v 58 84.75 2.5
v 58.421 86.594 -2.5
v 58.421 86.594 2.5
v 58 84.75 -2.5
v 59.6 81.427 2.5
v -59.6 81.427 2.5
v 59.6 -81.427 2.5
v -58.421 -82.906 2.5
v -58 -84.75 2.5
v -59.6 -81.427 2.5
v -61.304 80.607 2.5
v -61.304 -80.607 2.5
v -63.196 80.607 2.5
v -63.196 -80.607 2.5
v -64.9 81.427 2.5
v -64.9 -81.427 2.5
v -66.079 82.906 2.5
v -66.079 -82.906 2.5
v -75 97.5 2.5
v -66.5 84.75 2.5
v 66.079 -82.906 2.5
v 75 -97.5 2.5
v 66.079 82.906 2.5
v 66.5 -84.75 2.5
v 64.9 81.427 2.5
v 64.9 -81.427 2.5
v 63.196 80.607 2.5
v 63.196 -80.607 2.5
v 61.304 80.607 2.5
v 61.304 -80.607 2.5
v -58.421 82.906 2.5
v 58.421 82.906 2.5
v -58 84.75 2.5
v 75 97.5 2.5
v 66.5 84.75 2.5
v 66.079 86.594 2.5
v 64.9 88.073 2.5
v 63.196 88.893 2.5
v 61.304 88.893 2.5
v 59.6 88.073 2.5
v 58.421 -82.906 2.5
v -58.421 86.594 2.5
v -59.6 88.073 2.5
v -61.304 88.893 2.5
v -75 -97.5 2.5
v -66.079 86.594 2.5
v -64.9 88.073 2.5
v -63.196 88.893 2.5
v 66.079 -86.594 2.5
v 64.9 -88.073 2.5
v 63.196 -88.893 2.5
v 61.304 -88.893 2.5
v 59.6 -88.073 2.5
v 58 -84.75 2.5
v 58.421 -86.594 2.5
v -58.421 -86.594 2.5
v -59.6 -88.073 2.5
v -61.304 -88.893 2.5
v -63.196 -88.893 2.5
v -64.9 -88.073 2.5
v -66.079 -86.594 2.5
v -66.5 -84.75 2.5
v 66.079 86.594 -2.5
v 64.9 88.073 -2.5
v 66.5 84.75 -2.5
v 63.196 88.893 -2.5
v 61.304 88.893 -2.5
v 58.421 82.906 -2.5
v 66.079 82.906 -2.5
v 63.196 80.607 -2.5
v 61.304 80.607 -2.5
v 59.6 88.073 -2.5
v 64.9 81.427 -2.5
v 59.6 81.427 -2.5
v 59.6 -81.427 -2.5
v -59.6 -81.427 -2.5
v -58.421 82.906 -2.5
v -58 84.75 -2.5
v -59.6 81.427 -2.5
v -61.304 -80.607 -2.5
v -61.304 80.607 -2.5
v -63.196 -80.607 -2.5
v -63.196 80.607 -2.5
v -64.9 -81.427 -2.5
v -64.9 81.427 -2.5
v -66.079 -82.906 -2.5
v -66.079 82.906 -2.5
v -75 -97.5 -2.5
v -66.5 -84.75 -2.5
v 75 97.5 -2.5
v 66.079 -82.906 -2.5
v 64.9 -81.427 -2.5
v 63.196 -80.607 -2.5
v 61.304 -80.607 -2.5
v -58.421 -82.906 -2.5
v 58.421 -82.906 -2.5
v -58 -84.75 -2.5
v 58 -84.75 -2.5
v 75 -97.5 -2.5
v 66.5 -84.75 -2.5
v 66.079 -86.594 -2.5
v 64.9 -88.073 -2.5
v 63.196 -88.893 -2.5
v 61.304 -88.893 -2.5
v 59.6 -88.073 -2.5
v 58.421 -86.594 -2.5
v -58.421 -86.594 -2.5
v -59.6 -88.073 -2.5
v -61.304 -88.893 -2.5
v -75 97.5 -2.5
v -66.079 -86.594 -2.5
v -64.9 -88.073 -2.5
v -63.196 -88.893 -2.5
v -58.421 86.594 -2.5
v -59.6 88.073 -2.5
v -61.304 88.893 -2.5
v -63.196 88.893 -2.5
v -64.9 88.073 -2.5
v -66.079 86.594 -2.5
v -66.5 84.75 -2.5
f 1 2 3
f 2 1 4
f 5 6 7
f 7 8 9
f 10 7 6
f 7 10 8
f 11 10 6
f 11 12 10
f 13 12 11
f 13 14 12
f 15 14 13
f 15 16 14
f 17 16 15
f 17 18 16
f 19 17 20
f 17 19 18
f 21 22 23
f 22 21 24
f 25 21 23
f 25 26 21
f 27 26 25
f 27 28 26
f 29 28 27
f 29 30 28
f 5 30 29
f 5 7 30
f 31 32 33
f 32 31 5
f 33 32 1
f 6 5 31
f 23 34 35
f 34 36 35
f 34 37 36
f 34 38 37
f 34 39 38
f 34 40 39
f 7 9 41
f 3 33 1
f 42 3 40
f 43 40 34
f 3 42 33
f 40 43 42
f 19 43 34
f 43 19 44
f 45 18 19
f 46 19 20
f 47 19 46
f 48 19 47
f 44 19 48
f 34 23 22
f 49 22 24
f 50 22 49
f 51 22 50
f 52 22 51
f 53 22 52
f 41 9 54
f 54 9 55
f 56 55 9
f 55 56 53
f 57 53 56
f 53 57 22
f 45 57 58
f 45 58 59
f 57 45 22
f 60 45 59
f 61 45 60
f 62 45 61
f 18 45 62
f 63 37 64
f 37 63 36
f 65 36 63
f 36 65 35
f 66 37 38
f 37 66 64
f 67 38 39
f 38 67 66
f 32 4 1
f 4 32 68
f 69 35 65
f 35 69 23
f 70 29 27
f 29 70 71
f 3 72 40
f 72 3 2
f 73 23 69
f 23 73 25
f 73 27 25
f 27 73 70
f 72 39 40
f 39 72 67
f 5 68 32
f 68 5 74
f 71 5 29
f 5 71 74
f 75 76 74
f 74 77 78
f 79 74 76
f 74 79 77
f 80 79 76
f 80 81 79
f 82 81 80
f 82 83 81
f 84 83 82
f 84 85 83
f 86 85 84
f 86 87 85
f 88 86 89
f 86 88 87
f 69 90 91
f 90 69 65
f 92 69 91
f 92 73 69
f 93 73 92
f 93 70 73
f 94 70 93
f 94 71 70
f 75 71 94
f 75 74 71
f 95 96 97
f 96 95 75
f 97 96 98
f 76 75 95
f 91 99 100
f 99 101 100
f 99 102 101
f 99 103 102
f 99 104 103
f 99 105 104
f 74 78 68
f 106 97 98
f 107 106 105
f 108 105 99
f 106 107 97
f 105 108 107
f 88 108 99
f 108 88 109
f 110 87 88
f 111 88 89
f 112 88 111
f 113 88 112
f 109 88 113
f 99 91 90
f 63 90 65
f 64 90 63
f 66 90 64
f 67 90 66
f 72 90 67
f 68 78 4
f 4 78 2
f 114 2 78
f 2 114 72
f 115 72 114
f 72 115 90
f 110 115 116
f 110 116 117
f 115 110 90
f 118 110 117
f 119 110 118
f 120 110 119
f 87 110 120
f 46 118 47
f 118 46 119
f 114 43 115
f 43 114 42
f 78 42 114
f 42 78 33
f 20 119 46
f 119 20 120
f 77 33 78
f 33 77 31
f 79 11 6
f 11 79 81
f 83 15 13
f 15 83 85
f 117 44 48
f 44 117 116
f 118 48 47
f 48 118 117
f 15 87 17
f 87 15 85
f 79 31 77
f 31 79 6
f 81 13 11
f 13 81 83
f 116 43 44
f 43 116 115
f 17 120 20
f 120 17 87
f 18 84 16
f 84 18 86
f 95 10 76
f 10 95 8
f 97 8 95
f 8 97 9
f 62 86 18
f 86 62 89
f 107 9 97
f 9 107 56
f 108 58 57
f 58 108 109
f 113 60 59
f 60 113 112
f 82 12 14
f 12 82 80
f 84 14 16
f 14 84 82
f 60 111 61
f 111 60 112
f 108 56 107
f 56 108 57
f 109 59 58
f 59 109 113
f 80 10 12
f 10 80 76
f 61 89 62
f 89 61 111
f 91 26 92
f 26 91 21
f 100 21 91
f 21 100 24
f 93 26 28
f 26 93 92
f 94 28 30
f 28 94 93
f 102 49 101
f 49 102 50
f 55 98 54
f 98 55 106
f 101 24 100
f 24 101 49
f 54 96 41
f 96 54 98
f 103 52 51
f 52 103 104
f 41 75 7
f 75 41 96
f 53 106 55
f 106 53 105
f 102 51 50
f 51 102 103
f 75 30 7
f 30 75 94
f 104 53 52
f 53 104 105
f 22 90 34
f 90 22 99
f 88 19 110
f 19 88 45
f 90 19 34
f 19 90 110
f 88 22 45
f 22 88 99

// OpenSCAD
// Generated by SolidPython 1.1.3 on 2024-05-08 19:40:10


difference() {
	cube(center = true, size = [150, 195.0000000000, 5]);
	union() {
		translate(v = [62.2500000000, 84.7500000000]) {
			cylinder(center = true, h = 5, r = 4.2500000000);
		}
		translate(v = [-62.2500000000, 84.7500000000]) {
			cylinder(center = true, h = 5, r = 4.2500000000);
		}
		translate(v = [-62.2500000000, -84.7500000000]) {
			cylinder(center = true, h = 5, r = 4.2500000000);
		}
		translate(v = [62.2500000000, -84.7500000000]) {
			cylinder(center = true, h = 5, r = 4.2500000000);
		}
	}
}
/***********************************************
*********      SolidPython code:      **********
************************************************
 
import solid
import numpy as np
import numbers
import pudb
from solid.utils import *
import viewscad
import subprocess
import os
import os.path as osp
import math
import sys

chamfer_extrude=solid.import_scad("./chamfer_extrude.scad")
chamfer_extrude=chamfer_extrude.chamfer_extrude
r = viewscad.Renderer(width=800, height=800)

def debug(model,f_name,path="/home/ts/code/projects/mfd/designs/debug"):
    solid.scad_render_to_file(model,osp.join(path,f_name)+".scad")
#generate position list of wells using offset from center
wells_pos_from_center_4 = lambda offset: [[-offset,offset],
                                        [offset, offset],
                                        [-offset, -offset],
                                        [offset, -offset]]
wells_pos_from_center_2 = lambda offset: [[offset,0],
                                        [-offset,0]]

def make_well(dims,shape=None,height=None,dxf=False):
    def circle_cylinder():
        if dxf or (height is None):
            well = solid.circle(r=dims, segments=64)
        else:
            well = solid.cylinder(r=dims, h=height, segments=64, center = True)
        return well
    if dims is None:
        sys.exit("radius needs to be a number")
    if isinstance(dims, numbers.Number):
        well =circle_cylinder()
    elif len(dims)==1:
        if isinstance(dims[1], numbers.Number):
            well =circle_cylinder()
        else:
            sys.exit("radius needs to be a number")
    elif len(dims)==2:
        well = solid.square(dims,center = True)
    elif len(dims)==3:
        well = solid.cube(dims, center = True)
    return well

def wells_top_bottom(center_gap,device_dims=None,shape=None,height=None, positions = None, dxf = False,well_shape=None):
    if well_shape == None:
        well_shape = make_well(device_dims,shape=shape,height=height,dxf=dxf)
    wells = []
    if positions is None:
        offset = radius+radius/2.0
        positions = wells_pos_from_center_2(offset)
    if dxf or (height is None):
        height = 0
    for position in positions:
        if dxf:
            wells.append(solid.translate([position[0],position[1]])(well_shape))
        else:
            wells.append(solid.translate([position[0],position[1],height/2.0])(well_shape))
    return  union()(*wells)

#place wells in four corners 
def four_corner(radius,height=None, positions = None, dxf = False):
    #if well pos not specified set
    #to equally spaced by half radius
    if positions is None:
        offset = radius+radius/2.0
        positions = wells_pos_from_center_4(offset)
    if dxf or (height is None):
        height = 0
    #make wells at positions with specified radius and height
    wells = []
    for position in positions:
        #make circle if making dxf
        if dxf:
            well_shape = solid.circle(r=radius, segments=64)
            well_shape = solid.translate([position[0],position[1]])(well_shape)
        #if stl make cylinder
        else:
            well_shape = solid.cylinder(r=radius, h=height, segments=64, center = True)
            well_shape = solid.translate([position[0],position[1],height/2.0])(well_shape)
        wells.append(well_shape)
    return  union()(*wells)

#generate channels 
def make_channels(length,width,height=0,num_chans=1,max_chans=None,spacing=None, dxf = False,
                  rotate_channels=False):
    if dxf or (height is None):
        height = 0
    #if channel gap not defined, is equal to
    if spacing is None: spacing = width
    #calculate number of channels if fitting max num within given width
    if not max_chans is None:
        import math
        num_chans = math.floor((max_chans-spacing)/(width+spacing))
    #get total width of channel section  
    total_width = (width*num_chans)+(spacing*(num_chans-1))

    #make template channel
    #if rotate_channels: width, length = length, width
    if dxf:
        channel_t = solid.square([length,width],center = True)
    else:
        channel_t = solid.cube([length,width,height], center = True)

    #if number channels is even, offset the first channel to center its gap
    if num_chans % 2 == 0: centering = -(width/2.0+spacing/2.0)
    else: centering = 0
    #move template channel up to align bottom at z = 0 
    #and offset center if necessary
    if dxf:
        channel_t = solid.translate([0,centering])(channel_t)
    else:
        channel_t = solid.translate([0,centering,height/2.0])(channel_t)

    #if rotate_channels: length,width = width,length
    #start making the channels
    channels = []
    for i in range(num_chans):
        #if i=0 there is no translation
        #if i=1, we make the first channel adjacent to second
        direction = i

        #if i>=1, we add channels alternating left and right
        if i >= 1:
            direction = -(i/2.0)
            if i % 2 == 1: direction = (-direction)+0.5
                
        #make channel at right position and add it to channel list
        translation_coords = [0,direction*(width+spacing)]
        #if rotate_channels: translation_coords = [direction*(width+spacing),0]
        if dxf:
            channel = solid.translate(translation_coords)(channel_t)
        else:
            channel = solid.translate([*translation_coords,0])(channel_t)
        channels.append(channel)
    
    #group all channels as one object
    channels = union()(*channels)
    #compute the x,y,z dimensions in order to pass as arguments 
    #for construction of other parts of device (such as the chambers)
    measurements = {'x':(length/2.0,-length/2.0),
                    'y':(total_width/2.0,-total_width/2.0)}
    if not dxf:
        measurements['z'] = (height,0)
    if rotate_channels:
        channels = solid.rotate(90)(channels)
        measurements['x'],measurements['y']=measurements['y'],measurements['x']
    return channels,measurements

def make_chambers(msrs,height=None,extra=0,len_until=None,width=None, dxf = False):
    #computes x,y,z length
    total = lambda x : abs(x[0]) + abs(x[1])
    
    #if specific height if specified
    #otherwise use same height as channels
    if dxf:
        pass
    elif not height is None:
        msrs['z'] = (height,0)
    else:
        msrs['z'] = (0,0)
        
    #make copy of measurements from channels to modify chamber dimensions 
    #and add length to chambers as specified
    chamber_dims = msrs.copy()
    #calculate length of chamber to reach specified offset
    if not len_until is None:
        chamber_len = len_until-(msrs['x'][0])
    #or add specified length to channel length (if not specified, adds 0)
    else:
        chamber_len = msrs['x'][0]+extra
    #set the chamber length based 
    chamber_dims['x'] = (chamber_len/2.0,-(chamber_len/2.0))
    #compute final dimensions of chamber
    if not width is None:
        chamber_dims['y'] = (width/2.0,-width/2.0)
    chamber_dims = [total(size) for size in chamber_dims.values()]
        
    #calculate chamber translation offset to place adjacent to channels
    chamber_trslt = msrs['x'][0]+(chamber_len/2.0)
    #compute chamber translation coordinates to align with channels
    #x = 1 moves chamber above channels
    #x = -1 moves chamber below channels
    if dxf:
        trslt = lambda x : [x*(chamber_trslt),0]
    else:
        trslt = lambda x : [x*(chamber_trslt),0,msrs['z'][0]/2.0]
    
    #function to make chamber at top or at bottom 
    if dxf:
        move = lambda x : solid.translate(trslt(x))(solid.square(chamber_dims, center = True) )
    else:
        move = lambda x : solid.translate(trslt(x))(solid.cube(chamber_dims,center = True))
    #make top and bottom chambers and return them as grouped
    top = move(1)
    bottom = move(-1)
    #chambers=solid.rotate(90)(solid.union()(top,bottom))
    chambers=(solid.union()(top,bottom))

    return chambers

#create alignment features 
def alignment_features(unit,dims,grid_size, mask_size = None, alignment = "hollow", units_from_center = (2.5,2.5), corner_len=None):
    width = grid_size[0]*dims[0]
    length = grid_size[1]*dims[1]
    if mask_size is None and corner_len is None:
        corner_len = (dims[0] + dims[1]) /2 / 8
    corner = lambda thickness_div : solid.union()( solid.square([corner_len,corner_len/thickness_div],center=False), solid.square([corner_len/thickness_div,corner_len],center=False) )
    
    def make_full(thickness_div):
        thickness = corner_len/thickness_div
        tr = solid.translate([0, 0, 0 ])(solid.rotate(180)(corner(thickness_div)))
        tr = solid.translate([thickness/2,thickness/2,0])(tr)
        bl = solid.translate([0, 0, 0 ])(solid.rotate(0)(corner(thickness_div)))
        bl = solid.translate([-thickness/2,-thickness/2,0])(bl)
        return solid.union()(tr,bl)
    
    def make_hollow(thickness_div):
        thickness = corner_len/(thickness_div/2)
        inner = make_full(thickness_div)
        outer = make_full(thickness_div/2)
        hollow = outer - inner 
        return hollow
    
    center = (width /2 , length/2)
    mask_pos = lambda x,y : (center[0] + x*(float(units_from_center[0])*dims[0]), center[1] + y*(float(units_from_center[1])*dims[1]))
    positions = []
    positions.append(mask_pos(1,0))
    positions.append(mask_pos(0,1))
    positions.append(mask_pos(-1,0))
    positions.append(mask_pos(0,-1))
    make_mask = lambda mtype : make_hollow(8) if mtype == "hollow" else make_full(8)
    masks = [ solid.translate([*position,0])(make_mask(alignment)) for position in positions]
    
    solid.scad_render_to_file(solid.union()(*masks),"./designs/open_chamber/masks.scad")
    #return unit - solid.union()(*masks)
    return solid.union()(*masks,unit)

def create_outline(thickness, array, dims, grid_size,):
    width = grid_size[0]*dims[0] + thickness *2
    length = grid_size[1]*dims[1] + thickness *2
    outer = solid.translate([-thickness, -thickness,0])(solid.square([width, length]))
    return outer-array

def create_wall(wall_thickness, outline_thickness, dims, grid_size, wall_height = 2000, dxf = False):
    inner_width = grid_size[0]*dims[0] + outline_thickness *2
    inner_length = grid_size[1]*dims[1] + outline_thickness *2
    outer_width = inner_width + wall_thickness * 2
    outer_length = inner_length + wall_thickness * 2
    outer_pos_x = -outline_thickness-wall_thickness
    outer_pos_y = -outline_thickness-wall_thickness
    inner_pos_x = -outline_thickness
    inner_pos_y = -outline_thickness
    if dxf:
        inner_wall = solid.translate([inner_pos_x,
                                      inner_pos_y,
                                      0])(solid.square([inner_width, inner_length]))
        outer_wall = solid.translate([outer_pos_x,
                                      outer_pos_y,
                                      0])(solid.square([outer_width, outer_length]))

        return outer_wall-inner_wall
    else:
        inner_wall = solid.translate([inner_pos_x,
                                      inner_pos_y,
                                      0])(solid.cube([inner_width, inner_length,wall_height]))
        outer_wall = solid.translate([outer_pos_x,
                                      outer_pos_y,
                                      0])(solid.cube([outer_width, outer_length,wall_height]))

        return outer_wall-inner_wall, {'wall_height': wall_height,
                                       'wall_thickness': wall_thickness,
                                       'inner_width':inner_width,
                                       'inner_length': inner_length,
                                       'outer_width': outer_width,
                                       'outer_length': outer_length,
                                       'outer_pos_x' : outer_pos_x,
                                       'outer_pos_y' : outer_pos_y,
                                       'inner_pos_x' : inner_pos_x,
                                       'inner_pos_y' : inner_pos_y}

def create_thicker_wall(wall_thickness, outer_wall_offset, wall_dims, dims, grid_size, height_start = .2, height_end=2, dxf = False):
    addon_wall,thicker_wall_dims = create_wall(wall_thickness, outer_wall_offset, dims, grid_size, wall_height=height_end-height_start, dxf = False)
    addon_wall = solid.translate([0,0,height_start])(addon_wall)

    thicker_wall_dims['wall_height'] = height_end
    thicker_wall_dims['wall_thickness'] = wall_dims['wall_thickness'] + wall_thickness
    return addon_wall, thicker_wall_dims
 
def add_lock_to_wall(wall,wall_dims,y_offset = 0,cut_ratio=0.7,L_length=3, gap_ratio=0.05, axis="x",width_ratio=1/2):
    # Makes L shape
    def make_L(max_length,length_thickness,max_width,width_thickness,height,y_offset):
        length = solid.cube([max_length,length_thickness,height])
        width = solid.cube([width_thickness,max_width,height])
        width = solid.translate([max_length-(width_thickness),0,0])(width)
        L = solid.union()(width,length)
        debug(L,"L")
        if axis == "x":
            L = solid.rotate(-90)(L)
            L = solid.translate([0,max_length,0])(L)
        else:
            L = solid.rotate(-180)(L)
            L = solid.translate([max_length,max_width,0])(L)
        return solid.translate([0,0,y_offset])(L)
    
    lock_length = L_length
    lock_width = wall_dims['wall_thickness']*width_ratio
    lock_length_thickness = lock_width/2
    lock_width_thickness = lock_width/2
    L_lock = make_L(lock_length,lock_length_thickness,lock_width,lock_width_thickness, wall_dims['wall_height']-y_offset, y_offset)
    
    margin_space = lock_length - lock_length*(1-gap_ratio)
    key_length = lock_length-margin_space
    key_length_thickness = lock_length_thickness-(margin_space*2)
    key_width = lock_width-(margin_space*2)
    key_width_thickness = lock_width_thickness-(margin_space*2)
    L_key = make_L(key_length,key_length_thickness,key_width,key_width_thickness, wall_dims['wall_height']-y_offset, y_offset)
    L_key = solid.translate([margin_space,margin_space,0])(L_key)
    L = solid.union()(L_lock,L_key)
    debug(L,"L")
    
    #Make cube to be used as negative to split frame in a half
    #Can choose if making left or right negative, specify ratio of split
    def make_negative(right,cut_ratio):
        if axis == "x":
            if right:
                length = wall_dims['outer_length']*(1-cut_ratio)
                pos_x = wall_dims['outer_pos_x']+(wall_dims['outer_length']*cut_ratio)
            else:
                length = wall_dims['outer_length']*(cut_ratio)
                pos_x = wall_dims['outer_pos_x'] 
            negative = solid.cube([wall_dims['outer_width'],length, wall_dims['wall_height']])
            negative = solid.translate([wall_dims['outer_pos_y'],pos_x,0])(negative)
        else:
            if right:
                length = wall_dims['outer_width']*(1-cut_ratio)
                pos_x = wall_dims['outer_pos_y']+(wall_dims['outer_width']*cut_ratio)
            else:
                length = wall_dims['outer_width']*(cut_ratio)
                pos_x = wall_dims['outer_pos_y'] 
            negative = solid.cube([length,wall_dims['outer_length'], wall_dims['wall_height']])
            negative = solid.translate([pos_x,wall_dims['outer_pos_x'],0])(negative)
        return negative, pos_x, length 
                      
    #Make negatives
    negative_right, right_half_pos_x, right_half_length = make_negative(True,cut_ratio)
    negative_left, left_half_pos_x, right_half_length = make_negative(False,cut_ratio)
    #Make halves
    left_half = solid.difference()(wall,negative_right)
    right_half = solid.difference()(wall,negative_left)
    def place_L(L, L_length,L_width):
        #Place L on top wall       
        offset_to_center = (wall_dims['wall_thickness']-L_width)/2
        if axis == "x":
            y_pos_top = (wall_dims['outer_pos_y'] +
                    wall_dims['outer_width'] - 
                    L_width - offset_to_center)
            top_L = solid.translate([y_pos_top,
                                     right_half_pos_x-(L_length),
                                     0])(L)
            #Place L on bottom wall       
            y_pos_bottom = wall_dims['outer_pos_y']+offset_to_center
            bottom_L = solid.translate([y_pos_bottom,
                                        right_half_pos_x-L_length,
                                        0])(L)
        else:
            y_pos_top = (wall_dims['outer_pos_x'] +
                    wall_dims['outer_length'] -
                    (L_width+offset_to_center))
            top_L = solid.translate([right_half_pos_x-L_length,
                                     y_pos_top,
                                     0])(L)
            #Place L on bottom wall       
            y_pos_bottom = wall_dims['outer_pos_y']+offset_to_center
            bottom_L = solid.translate([right_half_pos_x-L_length,
                                        y_pos_bottom,
                                        0])(L)
        return bottom_L, top_L
    #Make complimentary L pieces through union and differences
    #Make Lock
    bottom_L_lock, top_L_lock = place_L(L_lock,L_length,lock_width)
    left_half = solid.difference()(left_half,bottom_L_lock)
    left_half = solid.difference()(left_half,top_L_lock)
    #Make Key
    bottom_L_key, top_L_key = place_L(L_key,L_length,lock_width)
    right_half = solid.union()(right_half,bottom_L_key)
    right_half = solid.union()(right_half,top_L_key)
    return left_half, right_half


#build a row x col grid of containment units
def make_unit_array(unit,dims,grid_size, dxf = False, alignment = None, mask_size = None,
                    units_from_center = None,alignment_offset=None, alignment_mark_size=1):
    units = []
    for col in range(grid_size[1]):
        for row in range(grid_size[0]):
            if dxf:
                units.append(solid.translate([row*dims[0],col*dims[1]])(unit))
            else:
                units.append(solid.translate([row*dims[0],col*dims[1],dims[2]/2.0])(unit))
    array = solid.union()(*units)
    if (not alignment is None) and dxf:
        if not alignment_offset is None:
            array = solid.translate([alignment_offset[0],alignment_offset[1]])(array)
        array = alignment_features(array,dims, grid_size, alignment = alignment, mask_size = None, units_from_center = units_from_center,corner_len=alignment_mark_size)
        if not alignment_offset is None:
            array = solid.translate([-alignment_offset[0],-alignment_offset[1]])(array)
    return array


def make_taylor(wells_pos = wells_pos_from_center_4(2.25), well_rad = 1.5 ,
                well_height = 2, chan_w = 0.01, chan_l = 1, chan_h = 0.010 ,
                chan_gap = 0.040, max_chans = None,num_chans=100, chamber_height  = 0.100,
                columns = 1, rows = 1, chamber_len_until=2.25, add_channels = True, add_wells = True, 
                add_chambers = True, save_path = "./", alignment = None, units_from_center = 2,
                mask_size = None, render_stl = False, outline_thickness = 0.050, dxf = True,
                wall_height = 15, wall_thickness = 0.95, casing_x=9, casing_y=9, casing_z=0,rotate_units=0):

    dims = [casing_x, casing_y, casing_z]
    wells = four_corner(well_rad,well_height, dxf = dxf, positions = wells_pos)
    debug(wells,"wells")
    channels, msrs = make_channels(chan_l,chan_w,chan_h,dxf=dxf, spacing = chan_gap, max_chans=max_chans,num_chans=num_chans)
    debug(channels,"channels")
    chambers = make_chambers(msrs,dxf = dxf, height=chamber_height,len_until=chamber_len_until)
    debug(chambers,"chambers")

    #add together and render
    device_parts = []
    if add_channels:
        device_parts.append(channels)
    if add_wells:
        device_parts.append(wells)
    if add_chambers:
        device_parts.append(chambers)
    device=union()(*device_parts)
    device = rotate(rotate_units)(device)

    device=solid.translate([dims[0]/2.0,dims[1]/2.0,0])(device)
    channels = rotate(rotate_units)(channels)
    channels=solid.translate([dims[0]/2,dims[1]/2,0])(channels)
    chambers_wells = union()(wells,chambers)
    chambers_wells = rotate(rotate_units)(chambers_wells)
    chambers_wells=solid.translate([dims[0]/2,dims[1]/2,0])(chambers_wells)

    file_name = str(rows)+'x'+str(columns)+'_units_'
    grid_size = [rows,columns]

    if alignment:
        alignment="full"
    device = make_unit_array(device,dims,grid_size, dxf=dxf, alignment = alignment,
                                 units_from_center = units_from_center)
    channels = make_unit_array(channels,dims,grid_size, dxf=dxf, alignment = alignment,
                                 units_from_center = units_from_center)
    if alignment=="full":
        alignment="hollow"

    chambers_wells = make_unit_array(chambers_wells,dims,grid_size, dxf=dxf, alignment = alignment,
                                 units_from_center =units_from_center)

    def save_model(model,prefix):
        model_fname = os.path.abspath(save_path+prefix+"_"+file_name+".scad")
        solid.scad_render_to_file(model,model_fname)
        return model_fname

    wells_fname = save_model(wells,"wells")
    channels_fname = save_model(channels,"channels")
    device_fname = save_model(device,"device")
    chambers_wells_fname = save_model(chambers_wells,"chambers_wells")
    return (chambers_wells,chambers_wells_fname), (channels,channels_fname), (device,device_fname)

def make_device(design='open',rows=8,columns=6,wells_pos = 4.5,well_offset=3.2, well_rad=3.2,well_height=0.1,
                chan_l=1,chan_w=0.01,chan_h=0.01,chan_gap=0.015,num_chans=101,dxf=True,save_path="./designs/open_chamber/",
                casing_x=9.0,casing_y=18.0,casing_z=0,rotate_units=90,units_from_center=(3,1),chamber_len_until=4.5,
                chamber_width=None,alignment=True, add_wells=True, add_channels=True,add_chambers=True,well_shape=None):

    dims = [casing_x, casing_y, casing_z]
    if design == "open":
        wells_pos=wells_pos_from_center_2(wells_pos)
        wells = wells_top_bottom(well_offset*2,device_dims=well_rad,height=well_height, dxf = dxf, positions = wells_pos,well_shape=well_shape)
    elif design == "closed":
        wells_pos=wells_pos_from_center_4(wells_pos)
        debug(wells,"wells")
        wells = four_corner(well_offset,well_height,device_dims=well_rad, dxf = dxf, positions = wells_pos)
    else:
        print(design+" is not a valid design.\n Choose valid design: 'open' or 'closed'")
        exit()
    wells = rotate(rotate_units)(wells)
    wells=solid.translate([dims[0]/2,dims[1]/2,0])(wells)
    debug(wells,"wells")

    channels, msrs = make_channels(chan_l,chan_w,chan_h,dxf=dxf, spacing = chan_gap, num_chans=num_chans,rotate_channels=False)
    channels = rotate(rotate_units)(channels)
    channels=solid.translate([dims[0]/2,dims[1]/2,0])(channels)

    chambers=make_chambers(msrs,height=None,extra=0,len_until=chamber_len_until, width=chamber_width,dxf = dxf)
    chambers = rotate(rotate_units)(chambers)
    chambers=solid.translate([dims[0]/2,dims[1]/2,0])(chambers)

    device_parts = []
    if add_channels:
        device_parts.append(channels)
    if add_wells:
        device_parts.append(wells)
    if add_chambers:
        device_parts.append(chambers)
    device = union()(*device_parts)
    #device = rotate(rotate_units)(device)
    #device=solid.translate([dims[0]/2.0,dims[1]/2.0,0])(device)

    chambers_wells = []
    if add_chambers:
        chambers_wells.append(chambers)
    if add_wells:
        chambers_wells.append(wells)
    chambers_wells = union()(*chambers_wells)
    #chambers_wells = union()(wells,chambers)
    #chambers_wells = rotate(rotate_units)(chambers_wells)
    #chambers_wells=solid.translate([dims[0]/2,dims[1]/2,0])(chambers_wells)

    file_name = str(rows)+'x'+str(columns)+'_units_'

    grid_size = [rows,columns]
    if alignment:
        alignment="full"
    device = make_unit_array(device,dims,grid_size, dxf=dxf, alignment = alignment,
                                 units_from_center = units_from_center)
    channels = make_unit_array(channels,dims,grid_size, dxf=dxf, alignment = alignment,
                                 units_from_center = units_from_center)
    if alignment=="full":
        alignment="hollow"

    chambers_wells = make_unit_array(chambers_wells,dims,grid_size, dxf=dxf, alignment = alignment,
                                 units_from_center =units_from_center)

    def save_model(model,prefix):
        model_fname = os.path.abspath(save_path+prefix+"_"+file_name+".scad")
        solid.scad_render_to_file(model,model_fname)
        return model_fname

    wells_fname = save_model(wells,"wells")
    channels_fname = save_model(channels,"channels")
    device_fname = save_model(device,"device")
    chambers_wells_fname = save_model(chambers_wells,"chambers_wells")
    return (chambers_wells,chambers_wells_fname), (channels,channels_fname), (device,device_fname)


def make_open_chamber(rows=8,columns=6,wells_pos = wells_pos_from_center_2(4.5), well_rad=3.2,well_height=0.1,
                      chan_l=1,chan_w=0.01,chan_h=0.01,chan_gap=0.015,num_chans=101,dxf=True,save_path="./designs/open_chamber/",
                      casing_x=9.0,casing_y=18.0,casing_z=0,rotate_units=90,units_from_center=(3,1),chamber_len_until=4.5,
                      chamber_width=None,alignment=True, add_wells=True, add_channels=True,add_chambers=True,well_shape=None):

    dims = [casing_x, casing_y, casing_z]
    wells = wells_top_bottom(well_rad,height=well_height, dxf = dxf, positions = wells_pos, well_shape=well_shape)
    channels, msrs = make_channels(chan_l,chan_w,chan_h,dxf=dxf, spacing = chan_gap, num_chans=num_chans,rotate_channels=False)
    chambers=make_chambers(msrs,height=None,extra=0,len_until=chamber_len_until, width=chamber_width,dxf = dxf)
    debug(chambers,"chambers")
    device_parts = []
    if add_channels:
        device_parts.append(channels)
    if add_wells:
        device_parts.append(wells)
    if add_chambers:
        device_parts.append(chambers)
    device = union()(*device_parts)
    device = rotate(rotate_units)(device)
    device=solid.translate([dims[0]/2.0,dims[1]/2.0,0])(device)
    channels = rotate(rotate_units)(channels)
    channels=solid.translate([dims[0]/2,dims[1]/2,0])(channels)
    chambers_wells = union()(wells,chambers)
    chambers_wells = rotate(rotate_units)(chambers_wells)
    chambers_wells=solid.translate([dims[0]/2,dims[1]/2,0])(chambers_wells)

    file_name = str(rows)+'x'+str(columns)+'_units_'

    grid_size = [rows,columns]
    if alignment:
        alignment="full"
    device = make_unit_array(device,dims,grid_size, dxf=dxf, alignment = alignment,
                                 units_from_center = units_from_center)
    channels = make_unit_array(channels,dims,grid_size, dxf=dxf, alignment = alignment,
                                 units_from_center = units_from_center)
    if alignment=="full":
        alignment="hollow"

    chambers_wells = make_unit_array(chambers_wells,dims,grid_size, dxf=dxf, alignment = alignment,
                                 units_from_center =units_from_center)

    def save_model(model,prefix):
        model_fname = os.path.abspath(save_path+prefix+"_"+file_name+".scad")
        solid.scad_render_to_file(model,model_fname)
        return model_fname

    wells_fname = save_model(wells,"wells")
    channels_fname = save_model(channels,"channels")
    device_fname = save_model(device,"device")
    chambers_wells_fname = save_model(chambers_wells,"chambers_wells")
    return (chambers_wells,chambers_wells_fname), (channels,channels_fname), (device,device_fname)

def to_dxf(scad_path):
    dxf_path = scad_path.replace(".scad",".dxf")
    subprocess.call(["openscad", "-o", dxf_path, scad_path])
    import ezdxf
    temp_dxf = ezdxf.readfile(dxf_path)
    temp_dxf.saveas(dxf_path)

#def make_walls(diameter,thickness,grid_size,dims,height=20,segments=256,make_inner=True):
#    wafer_wall_out = solid.cylinder(r=diameter/2,h=height, segments=segments)
#    wafer_wall_in = solid.cylinder(r=(diameter/2-thickness),h=height, segments=segments)
#    wafer_wall = solid.difference()(wafer_wall_out,wafer_wall_in)
#    wafer_wall = solid.translate([grid_size[1]*dims[1]/2.0,grid_size[0]*dims[0]/2.0])(wafer_wall)
#
#    vertical_wall_length = grid_size[1]*dims[1]
#    horizontal_wall_length = grid_size[0]*dims[0]
#    vertical_wall = solid.cube([vertical_wall_length,thickness,height],center = True)
#    vertical_wall = solid.translate([vertical_wall_length/2,0,height/2])(vertical_wall)
#    horizontal_wall = solid.cube([thickness,horizontal_wall_length,height],center = True)
#    horizontal_wall = solid.translate([0,vertical_wall_length/2,height/2])(horizontal_wall)
#    walls = []
#    walls.append(horizontal_wall)
#    walls.append(vertical_wall)
#    for col in range(grid_size[1]):
#        if col == grid_size[1]-1: 
#            walls.append(solid.translate([0,(col+1)*dims[1]])(vertical_wall))
#        elif col > 0 and col < grid_size[1]-1 and make_inner==True:
#            walls.append(solid.translate([0,(col+1)*dims[1]])(vertical_wall))
#    for row in range(grid_size[0]):
#        if row == grid_size[0]-1: 
#            walls.append(solid.translate([(row+1)*dims[0],0])(horizontal_wall))
#        elif row > 0 and row < grid_size[0]-1 and make_inner==True:
#            walls.append(solid.translate([(row+1)*dims[0],0])(horizontal_wall))
#    walls = union()(*walls)
#    wafer_walls = union()(walls,wafer_wall)
#    return walls,wafer_wall,wafer_walls

def make_walls(diameter,thickness,grid_size,dims,height=20,segments=256,make_inner=True,padx=0,pady=0):
    wafer_wall_out = solid.cylinder(r=diameter/2,h=height, segments=segments)
    wafer_wall_in = solid.cylinder(r=(diameter/2-thickness),h=height, segments=segments)
    wafer_wall = solid.difference()(wafer_wall_out,wafer_wall_in)
    wafer_wall = solid.translate([grid_size[1]*dims[1]/2.0,grid_size[0]*dims[0]/2.0])(wafer_wall)

    vertical_wall_length = grid_size[0]*dims[0]+padx
    horizontal_wall_length = grid_size[1]*dims[1]+pady
    vertical_wall = solid.cube([vertical_wall_length,thickness,height],center = True)
    vertical_wall = solid.translate([vertical_wall_length/2-pady/2,-padx/2,height/2])(vertical_wall)
    horizontal_wall = solid.cube([thickness,horizontal_wall_length,height],center = True)
    horizontal_wall = solid.translate([-pady/2,horizontal_wall_length/2-padx/2,height/2])(horizontal_wall)
    walls = []
    walls.append(horizontal_wall)
    walls.append(vertical_wall)
    for col in range(grid_size[1]):
        if col == grid_size[1]-1: 
            walls.append(solid.translate([0,(col+1)*dims[1]+pady])(vertical_wall))
        elif col > 0 and col < grid_size[1]-1 and make_inner==True:
            walls.append(solid.translate([0,(col+1)*dims[1]])(vertical_wall))
    for row in range(grid_size[0]):
        if row == grid_size[0]-1: 
            walls.append(solid.translate([(row+1)*dims[0]+padx,0])(horizontal_wall))
        elif row > 0 and row < grid_size[0]-1 and make_inner==True:
            walls.append(solid.translate([(row+1)*dims[0],0])(horizontal_wall))
    walls = union()(*walls)
    wafer_walls = union()(walls,wafer_wall)
    return walls,wafer_wall,wafer_walls

def save_model(model,base_path,base_name,dxf=True):
    if not os.path.exists(base_path):
        os.makedirs(base_path)
    dxf_path=osp.join(base_path,base_name+".scad")
    solid.scad_render_to_file(model,osp.join(dxf_path))
    if dxf:
        to_dxf(dxf_path)

def make_wafer(diameter,flat_len,thickness):
    wafer = solid.cylinder(r1=diameter/2,r2=diameter/2,h=thickness,segments=512,)()
    x_start_flat=(flat_len/2)
    y_start_flat = math.sqrt(((diameter/2)**2) - (x_start_flat**2) )
    height_delete_flat=diameter/2-y_start_flat
    flat_delete = solid.cube([flat_len,height_delete_flat,thickness],center=False)()
    flat_delete = solid.translate([-flat_len/2,y_start_flat,0])(flat_delete)
    wafer = solid.difference()(wafer,flat_delete)
    wafer = solid.rotate(90)(wafer)
    return wafer

def add_wafer_to_mask(wafer_size,flat_len,mask,grid_size,dims,wafer_line_thickness=0.1,outer_mask_thickness=5,alignment_offset=None):
    def make_wafer_mask(wafer_size,flat_len):
        wafer_mask = make_wafer(wafer_size,flat_len,1)
        wafer_mask = solid.projection()(wafer_mask)
        wafer_mask = solid.translate([grid_size[0]*dims[0]/2.0,grid_size[1]*dims[1]/2.0])(wafer_mask)
        if not alignment_offset is None:
            wafer_mask = solid.translate([-alignment_offset[0],-alignment_offset[1]])(wafer_mask)
        return wafer_mask

    inner_wafer_line_mask = make_wafer_mask(wafer_size-wafer_line_thickness/2,flat_len)
    outer_wafer_line_mask = make_wafer_mask(wafer_size+wafer_line_thickness/2,flat_len)
    outer_wafer_mask = make_wafer_mask(wafer_size+outer_mask_thickness,flat_len)
    outer_wafer_mask = solid.difference()(outer_wafer_mask,outer_wafer_line_mask)
    wafer_mask = solid.union()(outer_wafer_mask,inner_wafer_line_mask)

    return solid.difference()(wafer_mask,mask)

def make_posts(post_shape,post_height):
    posts = solid.linear_extrude(height=post_height)(post_shape)
    return posts

def make_wafer_empty(diameter,flat_len,thickness,margin,notch_len=20,notch_height=5,oversize=1.01):
    diameter*=oversize
    flat_len*=oversize
    wafer = make_wafer(diameter,flat_len,thickness)
    holder = solid.cylinder(r1=diameter/2+margin,r2=diameter/2+margin,h=thickness,segments=512)()
    holder = solid.difference()(holder,wafer)

    x_start_flat=(flat_len/2)
    y_start_flat = math.sqrt(((diameter/2)**2) - (x_start_flat**2) )
    height_delete_flat=diameter/2-y_start_flat
    notch = solid.cube([notch_len,notch_height,thickness],center=False)()
    notch = solid.translate([-notch_len/2,y_start_flat,0])(notch)
    notch = solid.rotate(90)(notch)
    return solid.difference()(holder,notch)

def wafer_print_calibration(diameter,thickness,height,z_offset):
    circles = []
    radii = []
    radii.append(diameter/2.0*0.8)
    radii.append(diameter/2.0*0.6)
    radii.append(diameter/2.0*0.4)
    radii.append(diameter/2.0*0.2)
    for radius in radii:
        inner = solid.cylinder(r1=radius-(thickness/2.0),r2=radius-(thickness/2.0),h=thickness,segments=512,)()
        outer = solid.cylinder(r1=radius+(thickness/2.0),r2=radius+(thickness/2.0),h=thickness,segments=512,)()
        diff = solid.difference()(outer,inner)
        circles.append(diff)
    circles = solid.union()(*circles)
    circles = solid.translate([0,0,z_offset])(circles)
    return circles

def make_rack(wells,dims,grid_size,alignment_offset,rack_x,rack_y,rack_thickness,bolt_width,add_bolts=True):

    #get X and Y dimensions of gride of pipette tips
    X_len = dims[0]*grid_size[0]
    Y_len = dims[1]*grid_size[1]
    #make rack
    rack = solid.cube([rack_x,rack_y,rack_thickness],center=True)

    if add_bolts:
    #add bolt holes
        bolt_hole=solid.cylinder(r=bolt_width/2,h=rack_thickness,center=True)()
        bolt_holes = []
        bolt_holes.append(solid.translate([rack_x/2-1.5*bolt_width,rack_y/2-1.5*bolt_width])(bolt_hole))
        bolt_holes.append(solid.translate([-rack_x/2+1.5*bolt_width,rack_y/2-1.5*bolt_width])(bolt_hole))
        bolt_holes.append(solid.translate([-rack_x/2+1.5*bolt_width,-rack_y/2+1.5*bolt_width])(bolt_hole))
        bolt_holes.append(solid.translate([rack_x/2-1.5*bolt_width,-rack_y/2+1.5*bolt_width])(bolt_hole))
        bolt_holes = solid.union()(*bolt_holes)
        rack=solid.difference()(rack,bolt_holes)
    rack_support = rack

    #center rack with pipette holes
    rack = solid.translate([0,0,rack_thickness/2])(rack)
    rack = solid.translate([X_len/2,Y_len/2])(rack)
    rack = solid.translate([-alignment_offset[0],-alignment_offset[1]])(rack)
    wells = solid.linear_extrude(height=rack_thickness)(wells)
    rack = solid.difference()(rack,wells)
    return rack, rack_support

def make_pillar(wells,dims,grid_size,alignment_offset,rack_x,rack_y,pillar_height,rack_thickness,bolt_width,add_bolts=True,taper_angle=1,bolt_position_corner=1.5):

    #get X and Y dimensions of gride of pipette tips
    X_len = dims[0]*grid_size[0]
    Y_len = dims[1]*grid_size[1]
    #make rack
    rack = solid.cube([rack_x,rack_y,rack_thickness],center=True)
    
    if add_bolts:
    #add bolt holes
        bolt_hole=solid.cylinder(r=bolt_width/2,h=rack_thickness,center=True)()
        bolt_holes = []
        bolt_holes.append(solid.translate([rack_x/2-bolt_position_corner*bolt_width,rack_y/2-bolt_position_corner*bolt_width])(bolt_hole))
        bolt_holes.append(solid.translate([-rack_x/2+bolt_position_corner*bolt_width,rack_y/2-bolt_position_corner*bolt_width])(bolt_hole))
        bolt_holes.append(solid.translate([-rack_x/2+bolt_position_corner*bolt_width,-rack_y/2+bolt_position_corner*bolt_width])(bolt_hole))
        bolt_holes.append(solid.translate([rack_x/2-bolt_position_corner*bolt_width,-rack_y/2+bolt_position_corner*bolt_width])(bolt_hole))
        bolt_holes = solid.union()(*bolt_holes)
        rack=solid.difference()(rack,bolt_holes)
    rack_support = rack

    #center rack with pipette holes
    #rack = solid.translate([0,0,-rack_thickness])(rack)
    rack = solid.translate([X_len/2,Y_len/2])(rack)
    rack = solid.translate([-alignment_offset[0],-alignment_offset[1]])(rack)
    if not taper_angle == 0:
        wells=chamfer_extrude(pillar_height,taper_angle,segments=20)(wells)
    else:
        wells = solid.linear_extrude(height=pillar_height)(wells)
    rack = solid.union()(rack,wells)
    return rack, rack_support

def deg_taper_len(height,deg):
    if not deg == 0:
        return height*math.tan(math.radians(deg))
    else:
        return 0

def make_outline(inner_dims,wall_thickness,grid_size,dims,alignment_offset):
    inner_dims=np.array(inner_dims)
    inner_outline=solid.square(inner_dims,center=True)
    outer_dims=inner_dims+wall_thickness
    outer_outline=solid.square(outer_dims,center=True)
    outline=solid.difference()(outer_outline,inner_outline)
    outline=solid.translate([grid_size[0]*dims[0]/2.0,grid_size[1]*dims[1]/2.0])(outline)
    return outline








 
 
************************************************/
